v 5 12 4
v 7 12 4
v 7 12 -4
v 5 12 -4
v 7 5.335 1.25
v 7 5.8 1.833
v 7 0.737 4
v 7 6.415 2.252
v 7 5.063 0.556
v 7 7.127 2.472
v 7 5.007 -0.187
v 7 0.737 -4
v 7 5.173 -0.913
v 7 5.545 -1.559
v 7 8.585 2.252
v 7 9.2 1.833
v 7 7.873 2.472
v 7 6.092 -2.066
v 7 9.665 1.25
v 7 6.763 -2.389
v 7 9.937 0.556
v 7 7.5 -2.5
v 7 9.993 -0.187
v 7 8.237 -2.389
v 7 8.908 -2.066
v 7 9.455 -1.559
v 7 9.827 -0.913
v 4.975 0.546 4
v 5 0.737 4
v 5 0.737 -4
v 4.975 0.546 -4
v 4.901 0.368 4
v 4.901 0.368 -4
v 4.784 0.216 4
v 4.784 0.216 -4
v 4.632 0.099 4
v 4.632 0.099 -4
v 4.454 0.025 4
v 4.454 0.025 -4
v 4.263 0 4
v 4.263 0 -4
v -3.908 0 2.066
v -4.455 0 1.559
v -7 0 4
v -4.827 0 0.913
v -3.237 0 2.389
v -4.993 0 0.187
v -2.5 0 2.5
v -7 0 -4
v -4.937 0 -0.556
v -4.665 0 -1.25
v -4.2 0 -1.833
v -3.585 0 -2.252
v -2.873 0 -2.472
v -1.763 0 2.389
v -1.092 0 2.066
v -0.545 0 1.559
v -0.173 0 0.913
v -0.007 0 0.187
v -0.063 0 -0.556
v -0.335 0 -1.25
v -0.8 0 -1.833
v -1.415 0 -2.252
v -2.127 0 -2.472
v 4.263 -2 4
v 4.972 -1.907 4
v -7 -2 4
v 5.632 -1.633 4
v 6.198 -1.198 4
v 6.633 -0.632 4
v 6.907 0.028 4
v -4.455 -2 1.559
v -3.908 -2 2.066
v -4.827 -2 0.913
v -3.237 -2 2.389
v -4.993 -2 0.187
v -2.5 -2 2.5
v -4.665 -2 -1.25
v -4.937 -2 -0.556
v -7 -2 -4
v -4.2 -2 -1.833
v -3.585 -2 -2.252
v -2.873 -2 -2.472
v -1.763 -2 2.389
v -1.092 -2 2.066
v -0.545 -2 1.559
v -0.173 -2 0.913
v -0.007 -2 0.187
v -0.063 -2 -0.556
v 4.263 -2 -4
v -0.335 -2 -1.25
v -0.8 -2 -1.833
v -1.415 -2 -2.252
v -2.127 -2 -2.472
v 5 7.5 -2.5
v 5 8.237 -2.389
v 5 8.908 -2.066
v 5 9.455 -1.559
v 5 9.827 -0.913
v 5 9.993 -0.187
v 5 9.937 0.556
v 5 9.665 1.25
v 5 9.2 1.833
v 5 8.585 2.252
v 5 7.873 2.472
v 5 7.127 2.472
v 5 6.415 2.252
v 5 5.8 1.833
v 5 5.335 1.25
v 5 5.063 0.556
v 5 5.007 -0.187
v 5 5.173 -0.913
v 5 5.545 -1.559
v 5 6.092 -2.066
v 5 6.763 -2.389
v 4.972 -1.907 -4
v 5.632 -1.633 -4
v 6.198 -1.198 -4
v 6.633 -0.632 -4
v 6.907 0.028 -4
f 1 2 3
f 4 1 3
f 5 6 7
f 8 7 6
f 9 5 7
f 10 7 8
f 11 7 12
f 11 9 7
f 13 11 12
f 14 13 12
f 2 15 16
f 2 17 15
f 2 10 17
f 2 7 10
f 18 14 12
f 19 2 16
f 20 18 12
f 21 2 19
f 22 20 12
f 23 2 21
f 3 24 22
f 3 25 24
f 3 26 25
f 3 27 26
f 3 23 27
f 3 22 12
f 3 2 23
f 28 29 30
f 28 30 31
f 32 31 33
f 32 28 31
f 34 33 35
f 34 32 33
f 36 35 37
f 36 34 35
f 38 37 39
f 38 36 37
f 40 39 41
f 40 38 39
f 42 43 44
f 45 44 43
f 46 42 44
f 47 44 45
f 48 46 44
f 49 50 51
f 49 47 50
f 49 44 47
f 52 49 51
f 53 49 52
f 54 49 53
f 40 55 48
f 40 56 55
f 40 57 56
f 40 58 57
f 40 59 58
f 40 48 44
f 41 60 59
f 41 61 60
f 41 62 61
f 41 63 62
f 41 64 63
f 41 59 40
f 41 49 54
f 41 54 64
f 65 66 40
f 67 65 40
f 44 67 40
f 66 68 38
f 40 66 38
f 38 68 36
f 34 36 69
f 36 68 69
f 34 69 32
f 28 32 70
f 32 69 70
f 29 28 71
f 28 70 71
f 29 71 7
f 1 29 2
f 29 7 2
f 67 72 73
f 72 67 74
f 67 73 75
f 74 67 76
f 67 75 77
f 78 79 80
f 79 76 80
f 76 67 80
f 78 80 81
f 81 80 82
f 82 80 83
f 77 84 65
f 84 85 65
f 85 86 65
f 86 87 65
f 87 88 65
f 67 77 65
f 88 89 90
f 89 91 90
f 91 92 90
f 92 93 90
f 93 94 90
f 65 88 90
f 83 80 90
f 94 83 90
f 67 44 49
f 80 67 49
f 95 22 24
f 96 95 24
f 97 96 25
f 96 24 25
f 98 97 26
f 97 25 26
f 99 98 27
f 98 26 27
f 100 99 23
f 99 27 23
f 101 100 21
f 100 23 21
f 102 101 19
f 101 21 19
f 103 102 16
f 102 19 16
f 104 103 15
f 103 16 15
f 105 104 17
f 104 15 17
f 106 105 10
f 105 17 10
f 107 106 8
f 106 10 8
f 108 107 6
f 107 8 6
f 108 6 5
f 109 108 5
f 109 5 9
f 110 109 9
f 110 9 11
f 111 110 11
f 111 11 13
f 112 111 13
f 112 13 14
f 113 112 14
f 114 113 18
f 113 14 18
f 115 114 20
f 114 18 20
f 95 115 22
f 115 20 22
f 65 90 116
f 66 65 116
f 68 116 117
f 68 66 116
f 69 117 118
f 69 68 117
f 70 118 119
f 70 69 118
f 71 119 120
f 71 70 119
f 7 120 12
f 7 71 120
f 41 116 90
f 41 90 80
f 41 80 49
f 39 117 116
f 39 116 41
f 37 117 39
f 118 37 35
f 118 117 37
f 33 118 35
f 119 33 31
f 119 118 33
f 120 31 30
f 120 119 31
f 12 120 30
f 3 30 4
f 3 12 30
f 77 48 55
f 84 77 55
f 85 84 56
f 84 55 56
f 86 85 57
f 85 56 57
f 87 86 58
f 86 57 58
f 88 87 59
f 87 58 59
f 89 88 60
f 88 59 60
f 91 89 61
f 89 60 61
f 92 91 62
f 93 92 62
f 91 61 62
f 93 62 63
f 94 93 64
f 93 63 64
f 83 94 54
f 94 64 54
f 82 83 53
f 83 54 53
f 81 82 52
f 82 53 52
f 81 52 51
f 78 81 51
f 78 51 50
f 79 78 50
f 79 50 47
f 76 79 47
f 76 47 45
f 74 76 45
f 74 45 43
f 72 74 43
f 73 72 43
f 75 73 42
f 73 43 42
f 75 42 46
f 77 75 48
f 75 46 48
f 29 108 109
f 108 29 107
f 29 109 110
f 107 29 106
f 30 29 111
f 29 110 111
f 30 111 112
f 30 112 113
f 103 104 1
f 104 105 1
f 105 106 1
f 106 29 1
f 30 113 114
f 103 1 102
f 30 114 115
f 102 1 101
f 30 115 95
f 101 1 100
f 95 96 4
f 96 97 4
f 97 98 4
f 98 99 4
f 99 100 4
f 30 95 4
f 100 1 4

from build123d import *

# Parameters (mm, degrees)
SKETCH1_W                    = 14
SKETCH1_H                    = 8
SKETCH1_R                    = 2.5
BASE_FLANGE1_DEPTH           = 2
EDGE_FLANGE1_STRIP_W         = 9.4732
EDGE_FLANGE1_STRIP_H         = 2
EDGE_FLANGE1_STRIP_CUT_DEPTH = 8
EDGE_FLANGE1_DEPTH           = 8
EDGE_FLANGE1_PROFILE_W       = 8
EDGE_FLANGE1_PROFILE_H       = 11.2634
EDGE_FLANGE1_PROFILE_R       = 2.5
EDGE_FLANGE1_FLAT_DEPTH      = 2


# Sheet-metal steps are written as plain solids
with BuildPart() as part:
    # Sketch1 → Base-Flange1 (new body)
    with BuildSketch(Plane(origin=(0, 0, 0), x_dir=(1, 0, 0), z_dir=(0, 1, 0))):
        Rectangle(SKETCH1_W, SKETCH1_H)
        with Locations(Location((-2.5, 0, 0), (0, 0, 270))):
            Circle(SKETCH1_R, mode=Mode.SUBTRACT)
    extrude(amount=-BASE_FLANGE1_DEPTH)

    # Edge-Flange1 strip (across the edge) → Edge-Flange1 strip cut (cut)
    with BuildSketch(Plane(origin=(7, 0, 4), x_dir=(-1, 0, 0), z_dir=(0, 0, -1))):
        with Locations((-2, -1)):
            Rectangle(EDGE_FLANGE1_STRIP_W, EDGE_FLANGE1_STRIP_H)
    extrude(amount=EDGE_FLANGE1_STRIP_CUT_DEPTH, mode=Mode.SUBTRACT)

    # Edge-Flange1 bend section (across the edge) → Edge-Flange1 (add)
    with BuildSketch(Plane(origin=(7, 0, 4), x_dir=(-1, 0, 0), z_dir=(0, 0, -1))):
        with BuildLine():
            Line((0, 0.7366), (2, 0.7366))
            ThreePointArc((2, 0.7366), (2.215745145, 0.215745145), (2.7366, 0))
            Line((2.7366, 0), (2.7366, -2))
            ThreePointArc((2.7366, -2), (0.801531583, -1.198468417), (0, 0.7366))
        make_face()
    extrude(amount=EDGE_FLANGE1_DEPTH)

    # Edge-Flange1 profile (on flange) → Edge-Flange1 flat (add)
    with BuildSketch(Plane(origin=(7, 0, 0), x_dir=(0, 0, -1), z_dir=(1, 0, 0))):
        with Locations((0, 6.3683)):
            Rectangle(EDGE_FLANGE1_PROFILE_W, EDGE_FLANGE1_PROFILE_H)
        with Locations((0, 7.5)):
            Circle(EDGE_FLANGE1_PROFILE_R, mode=Mode.SUBTRACT)
    extrude(amount=-EDGE_FLANGE1_FLAT_DEPTH)


solid = part.part
